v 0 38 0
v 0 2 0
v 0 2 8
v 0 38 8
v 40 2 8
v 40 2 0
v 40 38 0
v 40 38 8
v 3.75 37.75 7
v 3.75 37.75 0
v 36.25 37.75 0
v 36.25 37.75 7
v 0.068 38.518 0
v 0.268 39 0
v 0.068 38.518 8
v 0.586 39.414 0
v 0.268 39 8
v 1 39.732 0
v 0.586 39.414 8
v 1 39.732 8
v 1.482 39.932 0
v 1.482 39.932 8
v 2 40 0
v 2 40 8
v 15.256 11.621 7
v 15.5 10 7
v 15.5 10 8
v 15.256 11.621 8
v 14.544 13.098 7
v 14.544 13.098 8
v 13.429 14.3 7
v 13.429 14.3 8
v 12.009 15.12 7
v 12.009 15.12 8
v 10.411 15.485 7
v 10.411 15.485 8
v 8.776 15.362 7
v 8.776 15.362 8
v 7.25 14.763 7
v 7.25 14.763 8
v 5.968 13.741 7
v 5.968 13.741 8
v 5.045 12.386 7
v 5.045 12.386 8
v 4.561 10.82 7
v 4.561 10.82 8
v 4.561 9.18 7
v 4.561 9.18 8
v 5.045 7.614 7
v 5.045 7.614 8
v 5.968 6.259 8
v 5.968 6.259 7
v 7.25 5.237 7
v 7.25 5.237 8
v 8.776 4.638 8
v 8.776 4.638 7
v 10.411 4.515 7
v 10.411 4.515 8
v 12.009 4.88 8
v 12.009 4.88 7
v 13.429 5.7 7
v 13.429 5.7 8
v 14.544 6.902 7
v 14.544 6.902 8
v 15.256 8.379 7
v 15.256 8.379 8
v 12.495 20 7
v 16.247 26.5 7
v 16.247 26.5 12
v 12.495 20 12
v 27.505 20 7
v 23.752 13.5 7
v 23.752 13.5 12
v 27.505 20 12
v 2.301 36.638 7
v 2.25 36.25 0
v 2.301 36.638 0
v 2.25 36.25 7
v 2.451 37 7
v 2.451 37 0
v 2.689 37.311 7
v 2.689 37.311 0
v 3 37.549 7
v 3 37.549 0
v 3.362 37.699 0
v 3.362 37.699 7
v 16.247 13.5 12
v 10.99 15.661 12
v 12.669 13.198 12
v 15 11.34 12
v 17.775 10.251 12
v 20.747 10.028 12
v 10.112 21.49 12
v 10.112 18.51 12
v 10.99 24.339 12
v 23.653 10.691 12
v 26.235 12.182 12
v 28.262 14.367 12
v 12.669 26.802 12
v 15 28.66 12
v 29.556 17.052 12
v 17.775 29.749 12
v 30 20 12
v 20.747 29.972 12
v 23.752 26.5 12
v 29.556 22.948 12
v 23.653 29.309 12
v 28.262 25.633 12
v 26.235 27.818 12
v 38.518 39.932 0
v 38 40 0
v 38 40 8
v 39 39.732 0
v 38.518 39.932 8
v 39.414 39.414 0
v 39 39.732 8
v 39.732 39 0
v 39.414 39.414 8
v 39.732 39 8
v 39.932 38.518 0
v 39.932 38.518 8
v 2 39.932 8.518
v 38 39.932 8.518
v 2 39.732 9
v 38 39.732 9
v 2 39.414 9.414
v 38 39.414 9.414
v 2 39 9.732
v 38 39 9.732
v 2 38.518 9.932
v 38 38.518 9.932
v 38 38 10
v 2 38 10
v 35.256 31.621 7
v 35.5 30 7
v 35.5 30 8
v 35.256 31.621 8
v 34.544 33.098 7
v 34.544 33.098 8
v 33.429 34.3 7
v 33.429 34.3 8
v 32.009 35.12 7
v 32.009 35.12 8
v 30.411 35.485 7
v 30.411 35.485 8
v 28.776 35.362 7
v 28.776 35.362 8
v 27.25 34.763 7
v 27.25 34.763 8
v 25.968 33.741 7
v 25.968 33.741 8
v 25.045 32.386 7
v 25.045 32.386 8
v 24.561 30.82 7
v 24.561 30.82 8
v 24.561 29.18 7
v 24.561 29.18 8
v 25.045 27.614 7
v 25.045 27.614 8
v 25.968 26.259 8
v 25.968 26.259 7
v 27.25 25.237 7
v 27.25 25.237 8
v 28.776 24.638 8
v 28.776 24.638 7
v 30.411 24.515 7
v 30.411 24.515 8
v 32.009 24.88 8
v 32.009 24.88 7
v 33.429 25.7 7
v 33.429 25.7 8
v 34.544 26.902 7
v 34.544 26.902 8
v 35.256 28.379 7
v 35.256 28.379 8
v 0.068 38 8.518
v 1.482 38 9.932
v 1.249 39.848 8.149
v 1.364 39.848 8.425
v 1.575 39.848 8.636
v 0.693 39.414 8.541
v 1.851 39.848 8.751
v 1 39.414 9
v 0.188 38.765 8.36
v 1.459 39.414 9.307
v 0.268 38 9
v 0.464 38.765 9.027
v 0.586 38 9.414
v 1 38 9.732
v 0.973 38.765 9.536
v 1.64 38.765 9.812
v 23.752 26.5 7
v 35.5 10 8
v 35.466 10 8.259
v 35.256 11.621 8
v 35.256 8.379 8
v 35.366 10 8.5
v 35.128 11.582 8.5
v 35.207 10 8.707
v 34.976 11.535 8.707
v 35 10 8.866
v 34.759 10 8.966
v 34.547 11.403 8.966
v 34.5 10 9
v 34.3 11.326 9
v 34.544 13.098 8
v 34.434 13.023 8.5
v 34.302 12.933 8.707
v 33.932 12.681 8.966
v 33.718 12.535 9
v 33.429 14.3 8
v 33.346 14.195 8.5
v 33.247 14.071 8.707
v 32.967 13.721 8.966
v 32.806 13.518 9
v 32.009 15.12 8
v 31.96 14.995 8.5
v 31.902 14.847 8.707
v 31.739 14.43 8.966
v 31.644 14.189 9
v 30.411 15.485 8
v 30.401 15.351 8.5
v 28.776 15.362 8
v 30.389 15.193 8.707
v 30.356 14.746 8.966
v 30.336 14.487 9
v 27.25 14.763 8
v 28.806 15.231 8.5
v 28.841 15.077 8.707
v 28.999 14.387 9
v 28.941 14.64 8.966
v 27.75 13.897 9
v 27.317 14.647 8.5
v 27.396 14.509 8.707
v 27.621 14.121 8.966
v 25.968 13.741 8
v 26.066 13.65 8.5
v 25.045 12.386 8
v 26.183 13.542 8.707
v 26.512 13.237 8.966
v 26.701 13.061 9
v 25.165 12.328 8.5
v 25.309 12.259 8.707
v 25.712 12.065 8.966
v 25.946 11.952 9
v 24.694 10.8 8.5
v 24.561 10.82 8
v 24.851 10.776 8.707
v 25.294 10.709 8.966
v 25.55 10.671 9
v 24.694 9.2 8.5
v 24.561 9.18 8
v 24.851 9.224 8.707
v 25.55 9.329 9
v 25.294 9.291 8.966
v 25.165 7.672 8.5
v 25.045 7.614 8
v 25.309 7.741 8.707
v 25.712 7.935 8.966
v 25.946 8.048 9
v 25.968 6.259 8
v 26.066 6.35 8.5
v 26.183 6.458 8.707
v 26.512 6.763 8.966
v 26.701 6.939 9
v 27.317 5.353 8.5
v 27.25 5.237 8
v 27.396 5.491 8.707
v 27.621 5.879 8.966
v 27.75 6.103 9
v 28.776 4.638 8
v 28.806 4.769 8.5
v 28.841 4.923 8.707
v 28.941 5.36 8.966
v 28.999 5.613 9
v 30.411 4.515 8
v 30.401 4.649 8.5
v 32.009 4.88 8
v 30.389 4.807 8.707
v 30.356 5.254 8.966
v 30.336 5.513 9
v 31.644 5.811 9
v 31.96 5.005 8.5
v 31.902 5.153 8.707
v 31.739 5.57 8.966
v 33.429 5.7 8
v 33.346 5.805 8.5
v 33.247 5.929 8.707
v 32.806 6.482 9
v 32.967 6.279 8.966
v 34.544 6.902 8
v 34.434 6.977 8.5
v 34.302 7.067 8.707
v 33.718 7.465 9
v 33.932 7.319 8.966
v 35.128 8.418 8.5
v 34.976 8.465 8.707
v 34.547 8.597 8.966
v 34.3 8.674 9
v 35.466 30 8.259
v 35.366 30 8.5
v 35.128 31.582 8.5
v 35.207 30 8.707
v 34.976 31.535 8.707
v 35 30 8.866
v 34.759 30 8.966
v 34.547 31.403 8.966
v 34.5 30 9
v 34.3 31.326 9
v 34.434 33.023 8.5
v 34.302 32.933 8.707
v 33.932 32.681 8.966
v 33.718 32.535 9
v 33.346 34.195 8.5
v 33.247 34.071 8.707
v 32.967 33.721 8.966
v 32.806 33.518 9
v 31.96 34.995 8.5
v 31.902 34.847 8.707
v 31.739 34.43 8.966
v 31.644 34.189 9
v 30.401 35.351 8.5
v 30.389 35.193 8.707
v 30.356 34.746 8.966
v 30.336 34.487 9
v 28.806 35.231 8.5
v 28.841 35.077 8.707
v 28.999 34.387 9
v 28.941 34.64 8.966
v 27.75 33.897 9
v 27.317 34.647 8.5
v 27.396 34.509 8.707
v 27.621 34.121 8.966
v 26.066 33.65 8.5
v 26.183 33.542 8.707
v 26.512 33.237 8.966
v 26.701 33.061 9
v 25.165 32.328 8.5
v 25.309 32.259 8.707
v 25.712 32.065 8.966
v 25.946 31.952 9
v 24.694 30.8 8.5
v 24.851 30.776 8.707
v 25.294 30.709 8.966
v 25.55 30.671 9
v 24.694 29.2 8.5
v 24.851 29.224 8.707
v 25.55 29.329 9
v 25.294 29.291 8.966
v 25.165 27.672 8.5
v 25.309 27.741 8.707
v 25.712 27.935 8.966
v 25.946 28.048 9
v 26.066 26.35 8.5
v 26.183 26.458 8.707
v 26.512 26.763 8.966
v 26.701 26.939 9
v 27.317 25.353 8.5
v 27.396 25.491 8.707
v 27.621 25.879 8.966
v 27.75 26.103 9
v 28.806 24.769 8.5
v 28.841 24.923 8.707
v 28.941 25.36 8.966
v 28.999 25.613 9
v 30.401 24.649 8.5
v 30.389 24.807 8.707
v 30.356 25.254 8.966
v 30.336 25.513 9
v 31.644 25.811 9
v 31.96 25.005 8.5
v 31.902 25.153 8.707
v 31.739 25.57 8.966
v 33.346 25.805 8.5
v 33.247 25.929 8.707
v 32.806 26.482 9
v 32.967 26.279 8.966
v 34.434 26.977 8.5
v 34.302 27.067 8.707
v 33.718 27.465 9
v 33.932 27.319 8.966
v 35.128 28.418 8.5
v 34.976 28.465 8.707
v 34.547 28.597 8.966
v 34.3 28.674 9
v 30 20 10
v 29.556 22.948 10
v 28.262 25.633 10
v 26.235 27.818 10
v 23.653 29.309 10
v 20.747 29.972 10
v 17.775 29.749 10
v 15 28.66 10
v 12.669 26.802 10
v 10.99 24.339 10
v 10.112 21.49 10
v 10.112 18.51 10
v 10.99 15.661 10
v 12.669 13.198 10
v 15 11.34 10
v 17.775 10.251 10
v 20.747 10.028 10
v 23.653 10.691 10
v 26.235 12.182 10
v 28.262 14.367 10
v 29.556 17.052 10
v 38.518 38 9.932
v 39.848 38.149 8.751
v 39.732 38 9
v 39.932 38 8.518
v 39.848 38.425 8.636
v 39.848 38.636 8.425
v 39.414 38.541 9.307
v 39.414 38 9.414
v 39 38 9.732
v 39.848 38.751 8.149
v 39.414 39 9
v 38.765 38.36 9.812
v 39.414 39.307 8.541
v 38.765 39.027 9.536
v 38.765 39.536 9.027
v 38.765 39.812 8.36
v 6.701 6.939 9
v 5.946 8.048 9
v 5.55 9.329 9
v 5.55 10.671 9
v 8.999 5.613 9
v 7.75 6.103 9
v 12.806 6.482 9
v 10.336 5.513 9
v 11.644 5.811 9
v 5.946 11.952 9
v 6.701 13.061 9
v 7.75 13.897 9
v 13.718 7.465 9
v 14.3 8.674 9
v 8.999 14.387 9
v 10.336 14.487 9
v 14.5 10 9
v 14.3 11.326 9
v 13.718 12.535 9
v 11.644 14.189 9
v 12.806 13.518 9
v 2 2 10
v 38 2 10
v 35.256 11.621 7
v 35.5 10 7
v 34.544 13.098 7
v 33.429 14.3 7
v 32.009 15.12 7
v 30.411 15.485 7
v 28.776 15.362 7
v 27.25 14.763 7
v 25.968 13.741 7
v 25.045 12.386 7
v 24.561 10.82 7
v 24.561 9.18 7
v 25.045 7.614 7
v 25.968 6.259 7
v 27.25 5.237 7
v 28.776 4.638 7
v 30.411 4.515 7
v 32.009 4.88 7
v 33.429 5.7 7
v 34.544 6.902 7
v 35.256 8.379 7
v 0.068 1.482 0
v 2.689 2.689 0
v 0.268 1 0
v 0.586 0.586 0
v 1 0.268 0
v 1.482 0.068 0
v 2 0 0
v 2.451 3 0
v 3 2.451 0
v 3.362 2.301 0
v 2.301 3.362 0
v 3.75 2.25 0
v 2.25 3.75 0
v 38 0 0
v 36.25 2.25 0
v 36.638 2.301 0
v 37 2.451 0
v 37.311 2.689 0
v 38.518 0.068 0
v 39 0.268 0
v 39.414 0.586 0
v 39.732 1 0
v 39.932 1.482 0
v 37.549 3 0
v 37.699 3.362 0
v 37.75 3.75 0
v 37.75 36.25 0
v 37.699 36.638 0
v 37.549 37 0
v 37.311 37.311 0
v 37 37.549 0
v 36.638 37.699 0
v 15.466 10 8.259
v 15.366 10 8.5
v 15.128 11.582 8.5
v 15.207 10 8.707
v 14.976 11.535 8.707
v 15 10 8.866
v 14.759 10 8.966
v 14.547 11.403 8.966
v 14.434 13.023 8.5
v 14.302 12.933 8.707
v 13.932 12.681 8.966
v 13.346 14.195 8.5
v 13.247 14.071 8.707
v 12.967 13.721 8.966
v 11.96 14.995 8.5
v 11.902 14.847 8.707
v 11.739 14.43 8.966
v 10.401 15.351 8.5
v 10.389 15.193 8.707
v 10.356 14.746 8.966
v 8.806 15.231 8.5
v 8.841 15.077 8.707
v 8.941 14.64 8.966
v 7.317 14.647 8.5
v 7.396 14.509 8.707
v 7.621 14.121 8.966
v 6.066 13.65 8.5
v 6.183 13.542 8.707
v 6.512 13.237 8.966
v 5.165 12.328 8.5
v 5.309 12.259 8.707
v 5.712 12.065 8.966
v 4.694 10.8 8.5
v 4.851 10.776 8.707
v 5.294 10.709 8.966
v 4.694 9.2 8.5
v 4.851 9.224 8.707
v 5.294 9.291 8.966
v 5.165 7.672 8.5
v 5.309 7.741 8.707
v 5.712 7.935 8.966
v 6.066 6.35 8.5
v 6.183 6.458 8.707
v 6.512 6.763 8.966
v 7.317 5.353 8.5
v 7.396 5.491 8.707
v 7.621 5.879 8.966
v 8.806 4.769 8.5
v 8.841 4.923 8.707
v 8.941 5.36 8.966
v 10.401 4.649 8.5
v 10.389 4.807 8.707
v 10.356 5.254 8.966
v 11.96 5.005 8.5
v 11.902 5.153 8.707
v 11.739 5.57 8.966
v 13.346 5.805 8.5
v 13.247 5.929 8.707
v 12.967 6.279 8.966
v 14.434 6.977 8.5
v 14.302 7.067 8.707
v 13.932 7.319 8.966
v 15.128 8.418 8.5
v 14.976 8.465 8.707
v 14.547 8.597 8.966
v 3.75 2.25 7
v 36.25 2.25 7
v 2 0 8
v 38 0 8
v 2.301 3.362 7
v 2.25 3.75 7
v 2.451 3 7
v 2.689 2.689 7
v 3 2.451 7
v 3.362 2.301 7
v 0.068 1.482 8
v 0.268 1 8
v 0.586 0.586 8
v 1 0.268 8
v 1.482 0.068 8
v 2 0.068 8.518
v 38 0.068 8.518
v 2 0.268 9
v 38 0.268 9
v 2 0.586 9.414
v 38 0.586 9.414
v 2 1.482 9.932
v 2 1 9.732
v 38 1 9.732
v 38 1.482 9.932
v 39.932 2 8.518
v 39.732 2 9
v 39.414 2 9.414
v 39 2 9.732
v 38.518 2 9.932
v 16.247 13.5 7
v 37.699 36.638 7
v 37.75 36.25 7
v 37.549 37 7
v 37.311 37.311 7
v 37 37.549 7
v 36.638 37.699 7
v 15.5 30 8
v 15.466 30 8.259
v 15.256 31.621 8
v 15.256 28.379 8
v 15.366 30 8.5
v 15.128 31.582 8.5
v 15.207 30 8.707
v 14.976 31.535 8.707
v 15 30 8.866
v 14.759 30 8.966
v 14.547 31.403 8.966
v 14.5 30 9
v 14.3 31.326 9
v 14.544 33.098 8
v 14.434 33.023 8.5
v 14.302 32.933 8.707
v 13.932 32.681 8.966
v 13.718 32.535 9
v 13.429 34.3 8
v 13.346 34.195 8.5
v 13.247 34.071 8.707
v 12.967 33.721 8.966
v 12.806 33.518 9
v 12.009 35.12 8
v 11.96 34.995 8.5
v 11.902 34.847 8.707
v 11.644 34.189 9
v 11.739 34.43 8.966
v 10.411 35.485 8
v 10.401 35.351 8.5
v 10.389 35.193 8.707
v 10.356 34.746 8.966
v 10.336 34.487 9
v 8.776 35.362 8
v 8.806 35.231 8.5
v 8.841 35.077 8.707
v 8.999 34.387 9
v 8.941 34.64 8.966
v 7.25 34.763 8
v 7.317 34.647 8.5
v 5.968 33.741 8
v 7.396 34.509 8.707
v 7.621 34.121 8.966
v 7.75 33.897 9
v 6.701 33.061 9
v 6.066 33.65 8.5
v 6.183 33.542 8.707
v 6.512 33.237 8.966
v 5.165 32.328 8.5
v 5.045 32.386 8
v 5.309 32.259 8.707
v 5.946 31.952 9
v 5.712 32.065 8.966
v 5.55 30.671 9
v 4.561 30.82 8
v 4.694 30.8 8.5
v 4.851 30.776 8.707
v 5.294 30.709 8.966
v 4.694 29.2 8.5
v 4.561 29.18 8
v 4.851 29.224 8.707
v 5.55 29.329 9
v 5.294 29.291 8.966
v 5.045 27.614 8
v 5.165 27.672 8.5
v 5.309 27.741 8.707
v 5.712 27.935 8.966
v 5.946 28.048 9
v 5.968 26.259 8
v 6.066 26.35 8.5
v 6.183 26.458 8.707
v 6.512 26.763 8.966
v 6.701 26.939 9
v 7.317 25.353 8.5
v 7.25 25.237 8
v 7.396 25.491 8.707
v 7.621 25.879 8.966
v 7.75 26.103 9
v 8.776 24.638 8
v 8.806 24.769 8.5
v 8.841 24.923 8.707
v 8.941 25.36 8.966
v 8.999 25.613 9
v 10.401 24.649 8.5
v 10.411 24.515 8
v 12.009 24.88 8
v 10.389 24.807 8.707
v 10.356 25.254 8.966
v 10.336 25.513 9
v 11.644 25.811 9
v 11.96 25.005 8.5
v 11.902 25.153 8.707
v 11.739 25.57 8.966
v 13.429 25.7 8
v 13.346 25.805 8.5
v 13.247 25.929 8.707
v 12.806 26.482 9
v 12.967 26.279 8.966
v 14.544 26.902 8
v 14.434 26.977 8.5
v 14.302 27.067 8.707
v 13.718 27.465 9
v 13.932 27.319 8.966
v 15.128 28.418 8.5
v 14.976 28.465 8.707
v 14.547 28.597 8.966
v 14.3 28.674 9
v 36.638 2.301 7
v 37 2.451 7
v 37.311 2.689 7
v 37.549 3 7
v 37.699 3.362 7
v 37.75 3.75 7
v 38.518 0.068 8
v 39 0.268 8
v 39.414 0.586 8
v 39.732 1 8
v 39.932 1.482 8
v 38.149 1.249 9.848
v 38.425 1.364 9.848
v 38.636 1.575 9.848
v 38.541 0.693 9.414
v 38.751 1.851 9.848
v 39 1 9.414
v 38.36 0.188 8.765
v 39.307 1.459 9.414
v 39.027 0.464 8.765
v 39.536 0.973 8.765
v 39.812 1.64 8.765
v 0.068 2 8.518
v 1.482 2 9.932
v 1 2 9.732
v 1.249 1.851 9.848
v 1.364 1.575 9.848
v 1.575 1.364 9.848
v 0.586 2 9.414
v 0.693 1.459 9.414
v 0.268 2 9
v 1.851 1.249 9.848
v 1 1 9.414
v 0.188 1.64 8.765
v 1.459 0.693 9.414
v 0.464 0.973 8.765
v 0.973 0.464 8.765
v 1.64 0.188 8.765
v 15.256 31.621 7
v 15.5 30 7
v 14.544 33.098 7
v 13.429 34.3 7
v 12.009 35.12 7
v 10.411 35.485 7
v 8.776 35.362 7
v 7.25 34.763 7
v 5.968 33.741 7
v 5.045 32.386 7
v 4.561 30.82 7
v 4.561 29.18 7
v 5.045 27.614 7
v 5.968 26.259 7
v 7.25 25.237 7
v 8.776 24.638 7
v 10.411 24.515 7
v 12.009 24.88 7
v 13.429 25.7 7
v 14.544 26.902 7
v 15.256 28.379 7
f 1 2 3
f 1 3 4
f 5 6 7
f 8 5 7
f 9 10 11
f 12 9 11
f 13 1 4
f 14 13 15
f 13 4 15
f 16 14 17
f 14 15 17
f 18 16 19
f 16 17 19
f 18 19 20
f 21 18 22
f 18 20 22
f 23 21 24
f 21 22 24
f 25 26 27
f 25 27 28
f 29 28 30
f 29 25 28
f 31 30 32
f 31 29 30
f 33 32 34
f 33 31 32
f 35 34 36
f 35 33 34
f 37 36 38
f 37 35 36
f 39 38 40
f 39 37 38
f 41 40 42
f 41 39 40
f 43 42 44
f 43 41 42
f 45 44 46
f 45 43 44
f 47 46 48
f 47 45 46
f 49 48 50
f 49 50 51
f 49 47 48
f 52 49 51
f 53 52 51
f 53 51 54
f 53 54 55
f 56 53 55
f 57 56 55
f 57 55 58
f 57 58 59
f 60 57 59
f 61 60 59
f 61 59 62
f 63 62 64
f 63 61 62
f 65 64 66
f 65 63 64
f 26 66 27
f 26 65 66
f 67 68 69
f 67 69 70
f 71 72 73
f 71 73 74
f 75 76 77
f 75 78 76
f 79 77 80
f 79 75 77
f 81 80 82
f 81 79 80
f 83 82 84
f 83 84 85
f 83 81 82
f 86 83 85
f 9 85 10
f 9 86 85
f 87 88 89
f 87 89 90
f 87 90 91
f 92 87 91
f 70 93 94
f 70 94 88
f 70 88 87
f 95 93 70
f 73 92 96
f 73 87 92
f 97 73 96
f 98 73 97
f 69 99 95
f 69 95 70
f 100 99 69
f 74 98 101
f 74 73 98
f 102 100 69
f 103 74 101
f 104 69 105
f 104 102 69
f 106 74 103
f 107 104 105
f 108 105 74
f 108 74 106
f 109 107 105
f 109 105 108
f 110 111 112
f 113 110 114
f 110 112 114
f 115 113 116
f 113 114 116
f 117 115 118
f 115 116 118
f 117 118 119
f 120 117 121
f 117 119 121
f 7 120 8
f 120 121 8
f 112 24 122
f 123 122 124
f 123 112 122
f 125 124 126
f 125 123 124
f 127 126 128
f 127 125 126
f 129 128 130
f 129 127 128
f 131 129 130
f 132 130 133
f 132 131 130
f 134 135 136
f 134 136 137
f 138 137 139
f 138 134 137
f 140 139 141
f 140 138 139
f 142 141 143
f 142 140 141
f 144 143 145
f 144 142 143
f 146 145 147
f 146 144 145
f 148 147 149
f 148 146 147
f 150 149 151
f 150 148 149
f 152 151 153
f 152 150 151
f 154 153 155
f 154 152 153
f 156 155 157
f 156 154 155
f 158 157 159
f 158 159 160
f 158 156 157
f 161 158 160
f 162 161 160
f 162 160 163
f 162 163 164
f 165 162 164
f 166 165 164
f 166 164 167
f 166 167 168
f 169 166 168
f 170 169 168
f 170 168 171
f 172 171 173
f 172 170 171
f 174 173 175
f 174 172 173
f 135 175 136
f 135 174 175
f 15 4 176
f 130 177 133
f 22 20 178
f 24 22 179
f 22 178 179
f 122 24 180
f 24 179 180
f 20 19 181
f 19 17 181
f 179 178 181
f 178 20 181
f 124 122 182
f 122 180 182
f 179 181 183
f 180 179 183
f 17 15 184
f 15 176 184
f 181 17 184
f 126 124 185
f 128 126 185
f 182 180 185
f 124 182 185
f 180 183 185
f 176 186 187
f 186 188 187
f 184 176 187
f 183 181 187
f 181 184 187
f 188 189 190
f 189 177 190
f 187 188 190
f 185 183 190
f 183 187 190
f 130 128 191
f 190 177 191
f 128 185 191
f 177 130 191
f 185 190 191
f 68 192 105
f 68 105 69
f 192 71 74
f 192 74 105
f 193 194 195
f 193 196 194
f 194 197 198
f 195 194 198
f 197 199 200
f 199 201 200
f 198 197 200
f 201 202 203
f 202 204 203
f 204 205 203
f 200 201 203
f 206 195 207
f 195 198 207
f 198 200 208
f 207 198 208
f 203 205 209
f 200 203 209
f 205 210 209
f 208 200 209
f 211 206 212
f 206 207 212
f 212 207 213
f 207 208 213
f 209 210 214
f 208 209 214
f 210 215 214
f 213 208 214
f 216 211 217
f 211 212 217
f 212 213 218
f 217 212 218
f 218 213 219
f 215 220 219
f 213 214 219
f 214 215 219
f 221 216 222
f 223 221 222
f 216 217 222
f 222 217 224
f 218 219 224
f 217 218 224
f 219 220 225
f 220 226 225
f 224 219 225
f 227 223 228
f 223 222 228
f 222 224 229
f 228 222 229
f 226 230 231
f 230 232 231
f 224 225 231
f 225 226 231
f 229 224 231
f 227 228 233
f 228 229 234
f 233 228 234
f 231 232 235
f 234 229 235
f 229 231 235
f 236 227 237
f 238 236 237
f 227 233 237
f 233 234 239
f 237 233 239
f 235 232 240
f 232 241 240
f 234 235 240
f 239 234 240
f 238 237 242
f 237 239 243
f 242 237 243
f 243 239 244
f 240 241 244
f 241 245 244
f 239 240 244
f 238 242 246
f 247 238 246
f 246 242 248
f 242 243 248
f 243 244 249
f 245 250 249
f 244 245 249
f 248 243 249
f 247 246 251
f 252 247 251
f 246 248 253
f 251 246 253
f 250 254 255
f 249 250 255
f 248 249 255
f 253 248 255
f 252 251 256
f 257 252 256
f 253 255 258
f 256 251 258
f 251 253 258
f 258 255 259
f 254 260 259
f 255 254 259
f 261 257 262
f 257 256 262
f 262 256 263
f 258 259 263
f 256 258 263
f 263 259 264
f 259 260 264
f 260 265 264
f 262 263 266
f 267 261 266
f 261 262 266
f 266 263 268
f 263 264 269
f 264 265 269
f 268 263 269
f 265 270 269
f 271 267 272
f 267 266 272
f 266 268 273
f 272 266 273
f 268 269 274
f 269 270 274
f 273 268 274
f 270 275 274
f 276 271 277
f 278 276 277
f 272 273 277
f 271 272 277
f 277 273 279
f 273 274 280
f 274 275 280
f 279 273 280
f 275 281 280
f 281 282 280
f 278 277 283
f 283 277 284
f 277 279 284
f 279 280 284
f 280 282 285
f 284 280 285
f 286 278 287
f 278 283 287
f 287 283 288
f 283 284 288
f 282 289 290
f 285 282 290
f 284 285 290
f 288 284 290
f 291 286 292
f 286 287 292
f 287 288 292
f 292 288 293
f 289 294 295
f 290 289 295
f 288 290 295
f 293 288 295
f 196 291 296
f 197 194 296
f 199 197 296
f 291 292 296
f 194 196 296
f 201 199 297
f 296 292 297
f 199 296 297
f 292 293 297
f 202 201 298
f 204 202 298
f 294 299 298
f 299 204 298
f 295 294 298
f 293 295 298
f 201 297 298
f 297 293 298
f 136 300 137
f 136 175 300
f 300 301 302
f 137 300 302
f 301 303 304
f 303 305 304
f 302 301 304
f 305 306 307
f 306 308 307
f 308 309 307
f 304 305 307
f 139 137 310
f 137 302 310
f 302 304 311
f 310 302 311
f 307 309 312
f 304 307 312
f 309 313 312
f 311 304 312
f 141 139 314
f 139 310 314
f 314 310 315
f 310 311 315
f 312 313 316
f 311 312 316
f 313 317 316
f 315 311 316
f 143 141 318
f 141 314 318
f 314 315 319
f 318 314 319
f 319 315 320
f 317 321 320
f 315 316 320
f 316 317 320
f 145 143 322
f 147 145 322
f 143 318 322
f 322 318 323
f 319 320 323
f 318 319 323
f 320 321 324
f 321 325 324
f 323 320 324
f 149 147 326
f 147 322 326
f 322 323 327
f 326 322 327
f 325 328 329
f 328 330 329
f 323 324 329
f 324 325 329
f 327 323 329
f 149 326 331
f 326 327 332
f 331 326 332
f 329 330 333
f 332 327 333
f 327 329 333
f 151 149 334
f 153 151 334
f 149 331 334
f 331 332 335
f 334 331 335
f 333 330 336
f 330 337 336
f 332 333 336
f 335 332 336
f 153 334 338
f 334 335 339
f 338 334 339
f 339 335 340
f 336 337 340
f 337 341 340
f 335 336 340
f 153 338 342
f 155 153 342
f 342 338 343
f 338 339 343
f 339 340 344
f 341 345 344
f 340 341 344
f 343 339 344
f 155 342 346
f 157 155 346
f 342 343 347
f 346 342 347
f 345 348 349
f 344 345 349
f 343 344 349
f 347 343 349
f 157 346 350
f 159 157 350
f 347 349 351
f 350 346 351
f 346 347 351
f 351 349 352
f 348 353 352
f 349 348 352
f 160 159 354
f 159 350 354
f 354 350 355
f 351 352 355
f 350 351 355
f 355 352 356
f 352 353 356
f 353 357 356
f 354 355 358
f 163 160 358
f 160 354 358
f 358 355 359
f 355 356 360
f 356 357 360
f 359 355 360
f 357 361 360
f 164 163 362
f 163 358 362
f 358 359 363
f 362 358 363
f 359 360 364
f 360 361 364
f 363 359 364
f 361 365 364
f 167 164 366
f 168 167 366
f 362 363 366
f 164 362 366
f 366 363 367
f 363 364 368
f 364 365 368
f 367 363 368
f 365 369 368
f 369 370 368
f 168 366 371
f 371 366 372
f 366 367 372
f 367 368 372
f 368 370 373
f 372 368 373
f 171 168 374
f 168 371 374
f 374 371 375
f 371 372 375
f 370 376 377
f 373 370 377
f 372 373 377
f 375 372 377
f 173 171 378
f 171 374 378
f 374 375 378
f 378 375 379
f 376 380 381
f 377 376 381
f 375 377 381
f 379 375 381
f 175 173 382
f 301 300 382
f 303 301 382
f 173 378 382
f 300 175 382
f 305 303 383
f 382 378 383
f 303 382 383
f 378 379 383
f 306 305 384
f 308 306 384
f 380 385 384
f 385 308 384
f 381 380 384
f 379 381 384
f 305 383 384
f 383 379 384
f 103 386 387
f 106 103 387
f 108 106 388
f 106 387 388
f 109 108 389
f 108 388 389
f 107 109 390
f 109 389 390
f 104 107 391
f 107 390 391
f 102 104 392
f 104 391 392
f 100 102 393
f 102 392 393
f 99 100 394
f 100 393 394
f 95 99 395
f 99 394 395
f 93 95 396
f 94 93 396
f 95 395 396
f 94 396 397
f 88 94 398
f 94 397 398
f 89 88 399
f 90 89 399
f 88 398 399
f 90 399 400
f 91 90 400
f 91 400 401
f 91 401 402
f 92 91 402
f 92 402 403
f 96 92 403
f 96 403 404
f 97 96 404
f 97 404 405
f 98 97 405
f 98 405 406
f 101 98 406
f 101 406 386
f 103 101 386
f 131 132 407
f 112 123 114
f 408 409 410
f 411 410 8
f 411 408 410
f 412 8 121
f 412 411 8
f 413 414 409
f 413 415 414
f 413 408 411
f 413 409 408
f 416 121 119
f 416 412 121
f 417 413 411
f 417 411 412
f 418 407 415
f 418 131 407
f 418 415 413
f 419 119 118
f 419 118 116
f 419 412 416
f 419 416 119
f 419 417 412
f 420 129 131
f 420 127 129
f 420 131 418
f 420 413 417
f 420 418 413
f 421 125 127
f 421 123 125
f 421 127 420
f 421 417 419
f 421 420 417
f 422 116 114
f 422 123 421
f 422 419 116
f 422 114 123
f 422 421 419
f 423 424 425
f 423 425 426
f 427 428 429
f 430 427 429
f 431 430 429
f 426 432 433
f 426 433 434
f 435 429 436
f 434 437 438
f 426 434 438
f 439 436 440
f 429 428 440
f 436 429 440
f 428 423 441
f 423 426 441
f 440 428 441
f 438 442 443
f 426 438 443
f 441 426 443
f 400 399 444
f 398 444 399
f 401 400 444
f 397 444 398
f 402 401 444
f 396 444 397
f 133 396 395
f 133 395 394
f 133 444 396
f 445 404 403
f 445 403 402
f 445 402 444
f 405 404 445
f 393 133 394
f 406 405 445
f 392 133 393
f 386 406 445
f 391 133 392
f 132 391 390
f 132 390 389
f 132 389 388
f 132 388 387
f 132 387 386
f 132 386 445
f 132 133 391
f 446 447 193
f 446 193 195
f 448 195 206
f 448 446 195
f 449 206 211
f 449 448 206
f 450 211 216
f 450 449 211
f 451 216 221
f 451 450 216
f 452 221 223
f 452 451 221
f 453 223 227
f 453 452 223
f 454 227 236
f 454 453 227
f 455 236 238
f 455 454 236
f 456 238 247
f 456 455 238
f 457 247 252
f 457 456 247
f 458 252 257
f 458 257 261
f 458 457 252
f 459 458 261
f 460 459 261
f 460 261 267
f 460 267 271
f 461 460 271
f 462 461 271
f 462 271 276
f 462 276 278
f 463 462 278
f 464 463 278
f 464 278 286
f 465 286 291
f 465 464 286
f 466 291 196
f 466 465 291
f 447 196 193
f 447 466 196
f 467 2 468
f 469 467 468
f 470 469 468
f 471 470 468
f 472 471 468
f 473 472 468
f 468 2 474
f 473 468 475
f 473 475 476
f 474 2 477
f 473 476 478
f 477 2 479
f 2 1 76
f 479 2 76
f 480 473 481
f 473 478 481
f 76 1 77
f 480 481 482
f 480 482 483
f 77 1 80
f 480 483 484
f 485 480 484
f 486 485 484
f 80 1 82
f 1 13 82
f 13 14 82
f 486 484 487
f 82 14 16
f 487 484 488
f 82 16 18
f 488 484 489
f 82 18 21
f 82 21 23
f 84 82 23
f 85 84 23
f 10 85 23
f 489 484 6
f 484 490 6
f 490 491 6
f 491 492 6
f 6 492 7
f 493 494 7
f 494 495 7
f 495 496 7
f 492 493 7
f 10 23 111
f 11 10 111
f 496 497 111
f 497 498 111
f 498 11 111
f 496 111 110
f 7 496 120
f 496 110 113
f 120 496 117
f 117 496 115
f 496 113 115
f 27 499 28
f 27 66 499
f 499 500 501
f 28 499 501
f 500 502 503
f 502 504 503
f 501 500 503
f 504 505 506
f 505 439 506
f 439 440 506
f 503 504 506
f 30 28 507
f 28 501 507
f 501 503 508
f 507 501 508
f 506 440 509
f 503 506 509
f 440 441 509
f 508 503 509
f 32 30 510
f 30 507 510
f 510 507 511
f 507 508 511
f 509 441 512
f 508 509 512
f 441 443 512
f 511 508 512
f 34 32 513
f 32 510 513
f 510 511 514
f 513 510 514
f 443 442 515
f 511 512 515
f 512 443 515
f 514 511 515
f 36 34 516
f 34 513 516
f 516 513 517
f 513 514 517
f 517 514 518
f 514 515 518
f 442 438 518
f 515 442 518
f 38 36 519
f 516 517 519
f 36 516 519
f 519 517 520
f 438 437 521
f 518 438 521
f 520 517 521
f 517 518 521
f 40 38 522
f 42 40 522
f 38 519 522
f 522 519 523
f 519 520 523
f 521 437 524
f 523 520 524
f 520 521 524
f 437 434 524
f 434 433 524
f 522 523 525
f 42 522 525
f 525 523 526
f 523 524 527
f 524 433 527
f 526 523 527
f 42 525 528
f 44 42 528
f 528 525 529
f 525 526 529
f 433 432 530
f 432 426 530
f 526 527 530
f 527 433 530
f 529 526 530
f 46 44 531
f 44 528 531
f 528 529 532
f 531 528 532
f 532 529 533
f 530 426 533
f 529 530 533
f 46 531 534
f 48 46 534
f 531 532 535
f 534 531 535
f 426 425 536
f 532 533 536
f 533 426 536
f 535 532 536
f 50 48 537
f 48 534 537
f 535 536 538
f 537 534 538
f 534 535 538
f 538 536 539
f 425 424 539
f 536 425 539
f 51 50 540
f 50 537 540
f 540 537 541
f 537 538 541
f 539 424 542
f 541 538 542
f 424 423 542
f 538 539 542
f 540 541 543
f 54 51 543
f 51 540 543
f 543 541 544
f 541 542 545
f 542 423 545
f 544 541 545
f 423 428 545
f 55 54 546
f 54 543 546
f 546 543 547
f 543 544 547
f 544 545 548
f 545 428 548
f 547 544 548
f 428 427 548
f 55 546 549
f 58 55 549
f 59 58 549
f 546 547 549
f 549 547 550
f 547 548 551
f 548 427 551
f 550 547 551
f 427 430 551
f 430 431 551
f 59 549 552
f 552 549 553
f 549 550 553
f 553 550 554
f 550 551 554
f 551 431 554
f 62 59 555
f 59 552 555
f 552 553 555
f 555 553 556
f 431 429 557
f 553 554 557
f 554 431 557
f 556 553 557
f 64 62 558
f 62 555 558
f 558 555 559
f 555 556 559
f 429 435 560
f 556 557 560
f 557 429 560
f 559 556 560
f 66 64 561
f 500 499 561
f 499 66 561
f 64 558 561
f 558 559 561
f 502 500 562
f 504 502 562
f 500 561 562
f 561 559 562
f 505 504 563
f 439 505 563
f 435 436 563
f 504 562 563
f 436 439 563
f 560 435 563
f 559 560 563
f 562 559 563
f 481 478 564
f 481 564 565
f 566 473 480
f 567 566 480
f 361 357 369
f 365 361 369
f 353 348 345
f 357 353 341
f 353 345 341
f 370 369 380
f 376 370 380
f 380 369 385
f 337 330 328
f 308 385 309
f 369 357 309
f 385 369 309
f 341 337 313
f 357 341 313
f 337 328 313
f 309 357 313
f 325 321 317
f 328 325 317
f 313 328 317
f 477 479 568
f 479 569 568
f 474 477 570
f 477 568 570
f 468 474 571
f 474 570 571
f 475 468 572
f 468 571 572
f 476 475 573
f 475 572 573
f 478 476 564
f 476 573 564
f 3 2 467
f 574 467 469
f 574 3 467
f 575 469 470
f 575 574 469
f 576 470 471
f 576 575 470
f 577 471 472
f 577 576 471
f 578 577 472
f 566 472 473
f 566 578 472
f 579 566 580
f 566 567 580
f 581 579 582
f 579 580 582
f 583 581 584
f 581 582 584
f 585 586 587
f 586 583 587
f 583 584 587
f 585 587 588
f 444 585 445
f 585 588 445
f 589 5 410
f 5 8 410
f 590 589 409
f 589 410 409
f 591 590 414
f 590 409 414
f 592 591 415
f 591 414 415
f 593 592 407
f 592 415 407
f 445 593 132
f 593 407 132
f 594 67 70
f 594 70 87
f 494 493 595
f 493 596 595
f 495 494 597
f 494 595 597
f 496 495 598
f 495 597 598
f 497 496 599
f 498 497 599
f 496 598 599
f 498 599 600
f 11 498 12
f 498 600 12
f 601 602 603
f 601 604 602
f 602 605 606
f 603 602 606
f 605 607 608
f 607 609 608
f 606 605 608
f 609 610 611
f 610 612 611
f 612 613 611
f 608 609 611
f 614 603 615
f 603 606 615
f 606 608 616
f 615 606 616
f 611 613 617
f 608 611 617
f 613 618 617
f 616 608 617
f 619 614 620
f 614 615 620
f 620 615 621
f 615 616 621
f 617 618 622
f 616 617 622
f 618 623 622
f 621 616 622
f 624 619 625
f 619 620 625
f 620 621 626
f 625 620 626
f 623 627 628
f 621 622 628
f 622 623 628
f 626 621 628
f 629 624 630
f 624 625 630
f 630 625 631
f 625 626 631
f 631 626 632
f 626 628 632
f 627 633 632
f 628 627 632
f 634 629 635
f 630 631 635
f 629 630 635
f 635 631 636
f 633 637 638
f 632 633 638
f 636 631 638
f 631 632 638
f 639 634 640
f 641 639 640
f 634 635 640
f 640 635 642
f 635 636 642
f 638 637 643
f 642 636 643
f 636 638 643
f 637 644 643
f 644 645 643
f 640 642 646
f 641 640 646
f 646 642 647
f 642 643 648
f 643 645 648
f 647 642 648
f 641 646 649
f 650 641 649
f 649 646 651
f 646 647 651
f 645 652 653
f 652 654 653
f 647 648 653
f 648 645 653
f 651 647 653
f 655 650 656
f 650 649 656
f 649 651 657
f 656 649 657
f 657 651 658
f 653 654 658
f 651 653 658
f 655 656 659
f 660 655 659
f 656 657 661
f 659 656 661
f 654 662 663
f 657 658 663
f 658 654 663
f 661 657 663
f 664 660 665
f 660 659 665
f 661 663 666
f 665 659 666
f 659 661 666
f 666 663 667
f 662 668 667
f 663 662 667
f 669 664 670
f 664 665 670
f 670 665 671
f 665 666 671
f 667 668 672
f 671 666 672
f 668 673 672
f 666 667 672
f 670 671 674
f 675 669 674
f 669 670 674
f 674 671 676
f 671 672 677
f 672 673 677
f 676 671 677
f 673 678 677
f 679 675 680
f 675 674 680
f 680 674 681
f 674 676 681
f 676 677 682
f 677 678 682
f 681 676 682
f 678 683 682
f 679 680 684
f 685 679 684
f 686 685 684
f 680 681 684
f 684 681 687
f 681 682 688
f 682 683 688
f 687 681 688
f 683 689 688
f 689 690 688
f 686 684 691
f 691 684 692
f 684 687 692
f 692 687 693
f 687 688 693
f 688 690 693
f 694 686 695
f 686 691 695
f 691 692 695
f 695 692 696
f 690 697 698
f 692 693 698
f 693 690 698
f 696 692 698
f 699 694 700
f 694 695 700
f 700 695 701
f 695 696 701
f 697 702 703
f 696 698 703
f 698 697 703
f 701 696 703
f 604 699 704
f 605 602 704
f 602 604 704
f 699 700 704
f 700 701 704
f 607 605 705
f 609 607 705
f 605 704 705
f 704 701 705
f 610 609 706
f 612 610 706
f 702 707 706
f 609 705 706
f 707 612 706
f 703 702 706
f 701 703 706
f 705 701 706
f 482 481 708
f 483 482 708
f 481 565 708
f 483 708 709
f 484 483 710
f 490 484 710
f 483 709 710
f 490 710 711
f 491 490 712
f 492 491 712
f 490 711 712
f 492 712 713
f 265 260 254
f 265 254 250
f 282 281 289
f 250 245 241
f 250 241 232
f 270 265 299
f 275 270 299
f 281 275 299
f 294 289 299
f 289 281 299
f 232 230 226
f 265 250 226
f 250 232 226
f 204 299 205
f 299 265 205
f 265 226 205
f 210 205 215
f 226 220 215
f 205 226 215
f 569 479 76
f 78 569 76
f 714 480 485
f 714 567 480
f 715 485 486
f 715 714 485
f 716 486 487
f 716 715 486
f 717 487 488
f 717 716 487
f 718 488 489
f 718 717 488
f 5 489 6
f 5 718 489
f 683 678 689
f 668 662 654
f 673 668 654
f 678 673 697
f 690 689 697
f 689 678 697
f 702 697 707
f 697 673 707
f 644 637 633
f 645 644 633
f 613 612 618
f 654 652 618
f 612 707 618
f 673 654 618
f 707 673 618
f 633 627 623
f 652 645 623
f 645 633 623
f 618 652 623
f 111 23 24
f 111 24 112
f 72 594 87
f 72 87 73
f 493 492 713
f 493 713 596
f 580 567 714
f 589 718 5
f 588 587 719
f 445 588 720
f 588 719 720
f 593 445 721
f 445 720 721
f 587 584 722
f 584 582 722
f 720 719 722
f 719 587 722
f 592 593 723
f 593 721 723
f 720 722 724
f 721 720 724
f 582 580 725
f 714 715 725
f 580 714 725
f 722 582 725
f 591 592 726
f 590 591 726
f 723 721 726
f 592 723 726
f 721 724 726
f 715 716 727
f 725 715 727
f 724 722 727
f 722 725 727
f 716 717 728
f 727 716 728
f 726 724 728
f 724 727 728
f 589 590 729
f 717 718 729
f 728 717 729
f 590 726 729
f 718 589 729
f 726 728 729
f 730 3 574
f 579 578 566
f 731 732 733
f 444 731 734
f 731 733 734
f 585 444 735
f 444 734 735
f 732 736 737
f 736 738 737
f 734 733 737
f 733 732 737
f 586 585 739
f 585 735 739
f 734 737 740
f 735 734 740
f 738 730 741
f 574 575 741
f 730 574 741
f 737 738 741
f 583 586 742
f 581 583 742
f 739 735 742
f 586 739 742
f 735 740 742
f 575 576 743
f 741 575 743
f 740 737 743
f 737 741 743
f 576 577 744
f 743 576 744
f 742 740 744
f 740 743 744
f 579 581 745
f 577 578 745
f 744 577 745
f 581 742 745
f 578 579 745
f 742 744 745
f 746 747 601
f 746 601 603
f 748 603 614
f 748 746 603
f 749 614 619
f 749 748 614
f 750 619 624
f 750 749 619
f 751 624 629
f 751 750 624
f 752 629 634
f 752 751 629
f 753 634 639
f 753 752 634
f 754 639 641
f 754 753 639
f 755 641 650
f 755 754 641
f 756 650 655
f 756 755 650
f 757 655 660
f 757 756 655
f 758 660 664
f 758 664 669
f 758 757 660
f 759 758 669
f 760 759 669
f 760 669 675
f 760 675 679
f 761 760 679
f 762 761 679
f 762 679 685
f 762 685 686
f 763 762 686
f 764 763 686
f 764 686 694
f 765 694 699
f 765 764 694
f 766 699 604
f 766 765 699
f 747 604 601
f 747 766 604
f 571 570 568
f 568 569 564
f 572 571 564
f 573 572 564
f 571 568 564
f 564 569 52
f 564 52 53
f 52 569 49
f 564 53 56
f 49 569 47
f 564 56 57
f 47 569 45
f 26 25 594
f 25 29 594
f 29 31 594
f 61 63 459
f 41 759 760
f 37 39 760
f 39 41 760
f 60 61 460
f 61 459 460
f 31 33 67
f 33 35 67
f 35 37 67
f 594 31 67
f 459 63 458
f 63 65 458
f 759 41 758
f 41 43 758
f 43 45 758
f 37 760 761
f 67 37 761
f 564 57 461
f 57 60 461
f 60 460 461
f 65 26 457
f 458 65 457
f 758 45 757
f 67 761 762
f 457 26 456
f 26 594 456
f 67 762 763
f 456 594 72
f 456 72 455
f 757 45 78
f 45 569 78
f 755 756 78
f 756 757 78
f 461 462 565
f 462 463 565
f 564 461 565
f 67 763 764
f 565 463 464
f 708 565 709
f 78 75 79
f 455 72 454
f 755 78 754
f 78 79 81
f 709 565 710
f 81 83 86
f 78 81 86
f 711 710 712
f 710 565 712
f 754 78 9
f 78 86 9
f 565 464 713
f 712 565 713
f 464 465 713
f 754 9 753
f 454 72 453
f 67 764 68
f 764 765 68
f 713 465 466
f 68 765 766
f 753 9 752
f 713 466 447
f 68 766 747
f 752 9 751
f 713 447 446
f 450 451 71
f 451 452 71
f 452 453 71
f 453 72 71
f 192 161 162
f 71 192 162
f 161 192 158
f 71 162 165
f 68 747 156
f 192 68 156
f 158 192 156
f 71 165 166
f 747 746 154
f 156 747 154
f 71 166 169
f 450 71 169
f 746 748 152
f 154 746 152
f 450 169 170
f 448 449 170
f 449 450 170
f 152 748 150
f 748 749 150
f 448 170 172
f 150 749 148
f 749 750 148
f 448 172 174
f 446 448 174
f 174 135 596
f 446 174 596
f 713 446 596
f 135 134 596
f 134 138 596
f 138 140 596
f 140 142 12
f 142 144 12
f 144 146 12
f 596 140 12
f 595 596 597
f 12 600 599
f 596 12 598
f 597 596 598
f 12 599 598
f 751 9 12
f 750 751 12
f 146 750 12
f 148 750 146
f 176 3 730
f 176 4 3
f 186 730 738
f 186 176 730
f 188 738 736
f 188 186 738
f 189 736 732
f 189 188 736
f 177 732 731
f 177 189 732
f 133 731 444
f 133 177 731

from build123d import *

# Parameters (mm, degrees)
CYLINDER008_R     = 5.5
CYLINDER008_DEPTH = 2
FILLET005_R       = 1
CYLINDER009_R     = 5.5
CYLINDER009_DEPTH = 2
FILLET006_R       = 1
CYLINDER006_R     = 5.5
CYLINDER006_DEPTH = 2
FILLET003_R       = 1
CYLINDER007_R     = 5.5
CYLINDER007_DEPTH = 2
FILLET004_R       = 1
BOX001_W          = 35.5
BOX001_H          = 35.5
BOX001_DEPTH      = 7
FILLET_R          = 1.5
PRISM_DEPTH       = 12
CYLINDER_R        = 10
CYLINDER_DEPTH    = 12
BOX_W             = 40
BOX_H             = 40
BOX_DEPTH         = 10
FILLET001_R       = 2


with BuildPart() as fillet005:
    # Cylinder008 → Cylinder008 (new body)
    with BuildSketch(Plane.XY):
        Circle(CYLINDER008_R)
    extrude(amount=CYLINDER008_DEPTH)

    # Fillet005
    fillet005_edges = [fillet005.edges().sort_by_distance(p)[0] for p in [
        (-5.5, 0, 2),
    ]]
    fillet(fillet005_edges, radius=FILLET005_R)


with BuildPart() as fillet005_1:
    # Fillet005 placement: moved
    add(fillet005.part.moved(Location((10, 30, 7))))


with BuildPart() as fillet006:
    # Cylinder009 → Cylinder009 (new body)
    with BuildSketch(Plane.XY):
        Circle(CYLINDER009_R)
    extrude(amount=CYLINDER009_DEPTH)

    # Fillet006
    fillet006_edges = [fillet006.edges().sort_by_distance(p)[0] for p in [
        (-5.5, 0, 2),
    ]]
    fillet(fillet006_edges, radius=FILLET006_R)


with BuildPart() as fillet006_1:
    # Fillet006 placement: moved
    add(fillet006.part.moved(Location((30, 30, 7))))


with BuildPart() as fillet003:
    # Cylinder006 → Cylinder006 (new body)
    with BuildSketch(Plane.XY):
        Circle(CYLINDER006_R)
    extrude(amount=CYLINDER006_DEPTH)

    # Fillet003
    fillet003_edges = [fillet003.edges().sort_by_distance(p)[0] for p in [
        (-5.5, 0, 2),
    ]]
    fillet(fillet003_edges, radius=FILLET003_R)


with BuildPart() as fillet003_1:
    # Fillet003 placement: moved
    add(fillet003.part.moved(Location((10, 10, 7))))


with BuildPart() as fillet004:
    # Cylinder007 → Cylinder007 (new body)
    with BuildSketch(Plane.XY):
        Circle(CYLINDER007_R)
    extrude(amount=CYLINDER007_DEPTH)

    # Fillet004
    fillet004_edges = [fillet004.edges().sort_by_distance(p)[0] for p in [
        (-5.5, 0, 2),
    ]]
    fillet(fillet004_edges, radius=FILLET004_R)


with BuildPart() as fillet004_1:
    # Fillet004 placement: moved
    add(fillet004.part.moved(Location((30, 10, 7))))


with BuildPart() as fillet_body:
    # Box001 → Box001 (new body)
    with BuildSketch(Plane(origin=(2.25, 2.25, 0), x_dir=(1, 0, 0), z_dir=(0, 0, 1))):
        with Locations((17.75, 17.75)):
            Rectangle(BOX001_W, BOX001_H)
    extrude(amount=BOX001_DEPTH)

    # Fillet
    fillet_edges = [fillet_body.edges().sort_by_distance(p)[0] for p in [
        (2.25, 2.25, 3.5),
        (2.25, 37.75, 3.5),
        (37.75, 2.25, 3.5),
        (37.75, 37.75, 3.5),
    ]]
    fillet(fillet_edges, radius=FILLET_R)


with BuildPart() as prism:
    # Prism → Prism (new body)
    with BuildSketch(Plane(origin=(20, 20, 0), x_dir=(1, 0, 0), z_dir=(0, 0, 1))):
        Polygon((7.505, 0), (3.7525, 6.499521), (-3.7525, 6.499521), (-7.505, 0), (-3.7525, -6.499521), (3.7525, -6.499521), align=None)
    extrude(amount=PRISM_DEPTH)


with BuildPart() as cylinder:
    # Cylinder → Cylinder (new body)
    with BuildSketch(Plane(origin=(20, 20, 0), x_dir=(1, 0, 0), z_dir=(0, 0, 1))):
        Circle(CYLINDER_R)
    extrude(amount=CYLINDER_DEPTH)


with BuildPart() as cut010:
    # Box → Box (new body)
    with BuildSketch(Plane.XY):
        with Locations((20, 20)):
            Rectangle(BOX_W, BOX_H)
    extrude(amount=BOX_DEPTH)

    # Fusion: union Cylinder
    add(cylinder.part)

    # Cut: cut Prism
    add(prism.part, mode=Mode.SUBTRACT)

    # Fillet001
    fillet001_edges = [cut010.edges().sort_by_distance(p)[0] for p in [
        (0, 0, 5),
        (0, 20, 10),
        (0, 40, 5),
        (40, 0, 5),
        (20, 0, 10),
        (20, 40, 10),
        (40, 20, 10),
        (40, 40, 5),
    ]]
    fillet(fillet001_edges, radius=FILLET001_R)

    # Cut001: cut Fillet body
    add(fillet_body.part, mode=Mode.SUBTRACT)

    # Cut007: cut Fillet004
    add(fillet004_1.part, mode=Mode.SUBTRACT)

    # Cut008: cut Fillet003
    add(fillet003_1.part, mode=Mode.SUBTRACT)

    # Cut009: cut Fillet006
    add(fillet006_1.part, mode=Mode.SUBTRACT)

    # Cut010: cut Fillet005
    add(fillet005_1.part, mode=Mode.SUBTRACT)


solid = cut010.part
